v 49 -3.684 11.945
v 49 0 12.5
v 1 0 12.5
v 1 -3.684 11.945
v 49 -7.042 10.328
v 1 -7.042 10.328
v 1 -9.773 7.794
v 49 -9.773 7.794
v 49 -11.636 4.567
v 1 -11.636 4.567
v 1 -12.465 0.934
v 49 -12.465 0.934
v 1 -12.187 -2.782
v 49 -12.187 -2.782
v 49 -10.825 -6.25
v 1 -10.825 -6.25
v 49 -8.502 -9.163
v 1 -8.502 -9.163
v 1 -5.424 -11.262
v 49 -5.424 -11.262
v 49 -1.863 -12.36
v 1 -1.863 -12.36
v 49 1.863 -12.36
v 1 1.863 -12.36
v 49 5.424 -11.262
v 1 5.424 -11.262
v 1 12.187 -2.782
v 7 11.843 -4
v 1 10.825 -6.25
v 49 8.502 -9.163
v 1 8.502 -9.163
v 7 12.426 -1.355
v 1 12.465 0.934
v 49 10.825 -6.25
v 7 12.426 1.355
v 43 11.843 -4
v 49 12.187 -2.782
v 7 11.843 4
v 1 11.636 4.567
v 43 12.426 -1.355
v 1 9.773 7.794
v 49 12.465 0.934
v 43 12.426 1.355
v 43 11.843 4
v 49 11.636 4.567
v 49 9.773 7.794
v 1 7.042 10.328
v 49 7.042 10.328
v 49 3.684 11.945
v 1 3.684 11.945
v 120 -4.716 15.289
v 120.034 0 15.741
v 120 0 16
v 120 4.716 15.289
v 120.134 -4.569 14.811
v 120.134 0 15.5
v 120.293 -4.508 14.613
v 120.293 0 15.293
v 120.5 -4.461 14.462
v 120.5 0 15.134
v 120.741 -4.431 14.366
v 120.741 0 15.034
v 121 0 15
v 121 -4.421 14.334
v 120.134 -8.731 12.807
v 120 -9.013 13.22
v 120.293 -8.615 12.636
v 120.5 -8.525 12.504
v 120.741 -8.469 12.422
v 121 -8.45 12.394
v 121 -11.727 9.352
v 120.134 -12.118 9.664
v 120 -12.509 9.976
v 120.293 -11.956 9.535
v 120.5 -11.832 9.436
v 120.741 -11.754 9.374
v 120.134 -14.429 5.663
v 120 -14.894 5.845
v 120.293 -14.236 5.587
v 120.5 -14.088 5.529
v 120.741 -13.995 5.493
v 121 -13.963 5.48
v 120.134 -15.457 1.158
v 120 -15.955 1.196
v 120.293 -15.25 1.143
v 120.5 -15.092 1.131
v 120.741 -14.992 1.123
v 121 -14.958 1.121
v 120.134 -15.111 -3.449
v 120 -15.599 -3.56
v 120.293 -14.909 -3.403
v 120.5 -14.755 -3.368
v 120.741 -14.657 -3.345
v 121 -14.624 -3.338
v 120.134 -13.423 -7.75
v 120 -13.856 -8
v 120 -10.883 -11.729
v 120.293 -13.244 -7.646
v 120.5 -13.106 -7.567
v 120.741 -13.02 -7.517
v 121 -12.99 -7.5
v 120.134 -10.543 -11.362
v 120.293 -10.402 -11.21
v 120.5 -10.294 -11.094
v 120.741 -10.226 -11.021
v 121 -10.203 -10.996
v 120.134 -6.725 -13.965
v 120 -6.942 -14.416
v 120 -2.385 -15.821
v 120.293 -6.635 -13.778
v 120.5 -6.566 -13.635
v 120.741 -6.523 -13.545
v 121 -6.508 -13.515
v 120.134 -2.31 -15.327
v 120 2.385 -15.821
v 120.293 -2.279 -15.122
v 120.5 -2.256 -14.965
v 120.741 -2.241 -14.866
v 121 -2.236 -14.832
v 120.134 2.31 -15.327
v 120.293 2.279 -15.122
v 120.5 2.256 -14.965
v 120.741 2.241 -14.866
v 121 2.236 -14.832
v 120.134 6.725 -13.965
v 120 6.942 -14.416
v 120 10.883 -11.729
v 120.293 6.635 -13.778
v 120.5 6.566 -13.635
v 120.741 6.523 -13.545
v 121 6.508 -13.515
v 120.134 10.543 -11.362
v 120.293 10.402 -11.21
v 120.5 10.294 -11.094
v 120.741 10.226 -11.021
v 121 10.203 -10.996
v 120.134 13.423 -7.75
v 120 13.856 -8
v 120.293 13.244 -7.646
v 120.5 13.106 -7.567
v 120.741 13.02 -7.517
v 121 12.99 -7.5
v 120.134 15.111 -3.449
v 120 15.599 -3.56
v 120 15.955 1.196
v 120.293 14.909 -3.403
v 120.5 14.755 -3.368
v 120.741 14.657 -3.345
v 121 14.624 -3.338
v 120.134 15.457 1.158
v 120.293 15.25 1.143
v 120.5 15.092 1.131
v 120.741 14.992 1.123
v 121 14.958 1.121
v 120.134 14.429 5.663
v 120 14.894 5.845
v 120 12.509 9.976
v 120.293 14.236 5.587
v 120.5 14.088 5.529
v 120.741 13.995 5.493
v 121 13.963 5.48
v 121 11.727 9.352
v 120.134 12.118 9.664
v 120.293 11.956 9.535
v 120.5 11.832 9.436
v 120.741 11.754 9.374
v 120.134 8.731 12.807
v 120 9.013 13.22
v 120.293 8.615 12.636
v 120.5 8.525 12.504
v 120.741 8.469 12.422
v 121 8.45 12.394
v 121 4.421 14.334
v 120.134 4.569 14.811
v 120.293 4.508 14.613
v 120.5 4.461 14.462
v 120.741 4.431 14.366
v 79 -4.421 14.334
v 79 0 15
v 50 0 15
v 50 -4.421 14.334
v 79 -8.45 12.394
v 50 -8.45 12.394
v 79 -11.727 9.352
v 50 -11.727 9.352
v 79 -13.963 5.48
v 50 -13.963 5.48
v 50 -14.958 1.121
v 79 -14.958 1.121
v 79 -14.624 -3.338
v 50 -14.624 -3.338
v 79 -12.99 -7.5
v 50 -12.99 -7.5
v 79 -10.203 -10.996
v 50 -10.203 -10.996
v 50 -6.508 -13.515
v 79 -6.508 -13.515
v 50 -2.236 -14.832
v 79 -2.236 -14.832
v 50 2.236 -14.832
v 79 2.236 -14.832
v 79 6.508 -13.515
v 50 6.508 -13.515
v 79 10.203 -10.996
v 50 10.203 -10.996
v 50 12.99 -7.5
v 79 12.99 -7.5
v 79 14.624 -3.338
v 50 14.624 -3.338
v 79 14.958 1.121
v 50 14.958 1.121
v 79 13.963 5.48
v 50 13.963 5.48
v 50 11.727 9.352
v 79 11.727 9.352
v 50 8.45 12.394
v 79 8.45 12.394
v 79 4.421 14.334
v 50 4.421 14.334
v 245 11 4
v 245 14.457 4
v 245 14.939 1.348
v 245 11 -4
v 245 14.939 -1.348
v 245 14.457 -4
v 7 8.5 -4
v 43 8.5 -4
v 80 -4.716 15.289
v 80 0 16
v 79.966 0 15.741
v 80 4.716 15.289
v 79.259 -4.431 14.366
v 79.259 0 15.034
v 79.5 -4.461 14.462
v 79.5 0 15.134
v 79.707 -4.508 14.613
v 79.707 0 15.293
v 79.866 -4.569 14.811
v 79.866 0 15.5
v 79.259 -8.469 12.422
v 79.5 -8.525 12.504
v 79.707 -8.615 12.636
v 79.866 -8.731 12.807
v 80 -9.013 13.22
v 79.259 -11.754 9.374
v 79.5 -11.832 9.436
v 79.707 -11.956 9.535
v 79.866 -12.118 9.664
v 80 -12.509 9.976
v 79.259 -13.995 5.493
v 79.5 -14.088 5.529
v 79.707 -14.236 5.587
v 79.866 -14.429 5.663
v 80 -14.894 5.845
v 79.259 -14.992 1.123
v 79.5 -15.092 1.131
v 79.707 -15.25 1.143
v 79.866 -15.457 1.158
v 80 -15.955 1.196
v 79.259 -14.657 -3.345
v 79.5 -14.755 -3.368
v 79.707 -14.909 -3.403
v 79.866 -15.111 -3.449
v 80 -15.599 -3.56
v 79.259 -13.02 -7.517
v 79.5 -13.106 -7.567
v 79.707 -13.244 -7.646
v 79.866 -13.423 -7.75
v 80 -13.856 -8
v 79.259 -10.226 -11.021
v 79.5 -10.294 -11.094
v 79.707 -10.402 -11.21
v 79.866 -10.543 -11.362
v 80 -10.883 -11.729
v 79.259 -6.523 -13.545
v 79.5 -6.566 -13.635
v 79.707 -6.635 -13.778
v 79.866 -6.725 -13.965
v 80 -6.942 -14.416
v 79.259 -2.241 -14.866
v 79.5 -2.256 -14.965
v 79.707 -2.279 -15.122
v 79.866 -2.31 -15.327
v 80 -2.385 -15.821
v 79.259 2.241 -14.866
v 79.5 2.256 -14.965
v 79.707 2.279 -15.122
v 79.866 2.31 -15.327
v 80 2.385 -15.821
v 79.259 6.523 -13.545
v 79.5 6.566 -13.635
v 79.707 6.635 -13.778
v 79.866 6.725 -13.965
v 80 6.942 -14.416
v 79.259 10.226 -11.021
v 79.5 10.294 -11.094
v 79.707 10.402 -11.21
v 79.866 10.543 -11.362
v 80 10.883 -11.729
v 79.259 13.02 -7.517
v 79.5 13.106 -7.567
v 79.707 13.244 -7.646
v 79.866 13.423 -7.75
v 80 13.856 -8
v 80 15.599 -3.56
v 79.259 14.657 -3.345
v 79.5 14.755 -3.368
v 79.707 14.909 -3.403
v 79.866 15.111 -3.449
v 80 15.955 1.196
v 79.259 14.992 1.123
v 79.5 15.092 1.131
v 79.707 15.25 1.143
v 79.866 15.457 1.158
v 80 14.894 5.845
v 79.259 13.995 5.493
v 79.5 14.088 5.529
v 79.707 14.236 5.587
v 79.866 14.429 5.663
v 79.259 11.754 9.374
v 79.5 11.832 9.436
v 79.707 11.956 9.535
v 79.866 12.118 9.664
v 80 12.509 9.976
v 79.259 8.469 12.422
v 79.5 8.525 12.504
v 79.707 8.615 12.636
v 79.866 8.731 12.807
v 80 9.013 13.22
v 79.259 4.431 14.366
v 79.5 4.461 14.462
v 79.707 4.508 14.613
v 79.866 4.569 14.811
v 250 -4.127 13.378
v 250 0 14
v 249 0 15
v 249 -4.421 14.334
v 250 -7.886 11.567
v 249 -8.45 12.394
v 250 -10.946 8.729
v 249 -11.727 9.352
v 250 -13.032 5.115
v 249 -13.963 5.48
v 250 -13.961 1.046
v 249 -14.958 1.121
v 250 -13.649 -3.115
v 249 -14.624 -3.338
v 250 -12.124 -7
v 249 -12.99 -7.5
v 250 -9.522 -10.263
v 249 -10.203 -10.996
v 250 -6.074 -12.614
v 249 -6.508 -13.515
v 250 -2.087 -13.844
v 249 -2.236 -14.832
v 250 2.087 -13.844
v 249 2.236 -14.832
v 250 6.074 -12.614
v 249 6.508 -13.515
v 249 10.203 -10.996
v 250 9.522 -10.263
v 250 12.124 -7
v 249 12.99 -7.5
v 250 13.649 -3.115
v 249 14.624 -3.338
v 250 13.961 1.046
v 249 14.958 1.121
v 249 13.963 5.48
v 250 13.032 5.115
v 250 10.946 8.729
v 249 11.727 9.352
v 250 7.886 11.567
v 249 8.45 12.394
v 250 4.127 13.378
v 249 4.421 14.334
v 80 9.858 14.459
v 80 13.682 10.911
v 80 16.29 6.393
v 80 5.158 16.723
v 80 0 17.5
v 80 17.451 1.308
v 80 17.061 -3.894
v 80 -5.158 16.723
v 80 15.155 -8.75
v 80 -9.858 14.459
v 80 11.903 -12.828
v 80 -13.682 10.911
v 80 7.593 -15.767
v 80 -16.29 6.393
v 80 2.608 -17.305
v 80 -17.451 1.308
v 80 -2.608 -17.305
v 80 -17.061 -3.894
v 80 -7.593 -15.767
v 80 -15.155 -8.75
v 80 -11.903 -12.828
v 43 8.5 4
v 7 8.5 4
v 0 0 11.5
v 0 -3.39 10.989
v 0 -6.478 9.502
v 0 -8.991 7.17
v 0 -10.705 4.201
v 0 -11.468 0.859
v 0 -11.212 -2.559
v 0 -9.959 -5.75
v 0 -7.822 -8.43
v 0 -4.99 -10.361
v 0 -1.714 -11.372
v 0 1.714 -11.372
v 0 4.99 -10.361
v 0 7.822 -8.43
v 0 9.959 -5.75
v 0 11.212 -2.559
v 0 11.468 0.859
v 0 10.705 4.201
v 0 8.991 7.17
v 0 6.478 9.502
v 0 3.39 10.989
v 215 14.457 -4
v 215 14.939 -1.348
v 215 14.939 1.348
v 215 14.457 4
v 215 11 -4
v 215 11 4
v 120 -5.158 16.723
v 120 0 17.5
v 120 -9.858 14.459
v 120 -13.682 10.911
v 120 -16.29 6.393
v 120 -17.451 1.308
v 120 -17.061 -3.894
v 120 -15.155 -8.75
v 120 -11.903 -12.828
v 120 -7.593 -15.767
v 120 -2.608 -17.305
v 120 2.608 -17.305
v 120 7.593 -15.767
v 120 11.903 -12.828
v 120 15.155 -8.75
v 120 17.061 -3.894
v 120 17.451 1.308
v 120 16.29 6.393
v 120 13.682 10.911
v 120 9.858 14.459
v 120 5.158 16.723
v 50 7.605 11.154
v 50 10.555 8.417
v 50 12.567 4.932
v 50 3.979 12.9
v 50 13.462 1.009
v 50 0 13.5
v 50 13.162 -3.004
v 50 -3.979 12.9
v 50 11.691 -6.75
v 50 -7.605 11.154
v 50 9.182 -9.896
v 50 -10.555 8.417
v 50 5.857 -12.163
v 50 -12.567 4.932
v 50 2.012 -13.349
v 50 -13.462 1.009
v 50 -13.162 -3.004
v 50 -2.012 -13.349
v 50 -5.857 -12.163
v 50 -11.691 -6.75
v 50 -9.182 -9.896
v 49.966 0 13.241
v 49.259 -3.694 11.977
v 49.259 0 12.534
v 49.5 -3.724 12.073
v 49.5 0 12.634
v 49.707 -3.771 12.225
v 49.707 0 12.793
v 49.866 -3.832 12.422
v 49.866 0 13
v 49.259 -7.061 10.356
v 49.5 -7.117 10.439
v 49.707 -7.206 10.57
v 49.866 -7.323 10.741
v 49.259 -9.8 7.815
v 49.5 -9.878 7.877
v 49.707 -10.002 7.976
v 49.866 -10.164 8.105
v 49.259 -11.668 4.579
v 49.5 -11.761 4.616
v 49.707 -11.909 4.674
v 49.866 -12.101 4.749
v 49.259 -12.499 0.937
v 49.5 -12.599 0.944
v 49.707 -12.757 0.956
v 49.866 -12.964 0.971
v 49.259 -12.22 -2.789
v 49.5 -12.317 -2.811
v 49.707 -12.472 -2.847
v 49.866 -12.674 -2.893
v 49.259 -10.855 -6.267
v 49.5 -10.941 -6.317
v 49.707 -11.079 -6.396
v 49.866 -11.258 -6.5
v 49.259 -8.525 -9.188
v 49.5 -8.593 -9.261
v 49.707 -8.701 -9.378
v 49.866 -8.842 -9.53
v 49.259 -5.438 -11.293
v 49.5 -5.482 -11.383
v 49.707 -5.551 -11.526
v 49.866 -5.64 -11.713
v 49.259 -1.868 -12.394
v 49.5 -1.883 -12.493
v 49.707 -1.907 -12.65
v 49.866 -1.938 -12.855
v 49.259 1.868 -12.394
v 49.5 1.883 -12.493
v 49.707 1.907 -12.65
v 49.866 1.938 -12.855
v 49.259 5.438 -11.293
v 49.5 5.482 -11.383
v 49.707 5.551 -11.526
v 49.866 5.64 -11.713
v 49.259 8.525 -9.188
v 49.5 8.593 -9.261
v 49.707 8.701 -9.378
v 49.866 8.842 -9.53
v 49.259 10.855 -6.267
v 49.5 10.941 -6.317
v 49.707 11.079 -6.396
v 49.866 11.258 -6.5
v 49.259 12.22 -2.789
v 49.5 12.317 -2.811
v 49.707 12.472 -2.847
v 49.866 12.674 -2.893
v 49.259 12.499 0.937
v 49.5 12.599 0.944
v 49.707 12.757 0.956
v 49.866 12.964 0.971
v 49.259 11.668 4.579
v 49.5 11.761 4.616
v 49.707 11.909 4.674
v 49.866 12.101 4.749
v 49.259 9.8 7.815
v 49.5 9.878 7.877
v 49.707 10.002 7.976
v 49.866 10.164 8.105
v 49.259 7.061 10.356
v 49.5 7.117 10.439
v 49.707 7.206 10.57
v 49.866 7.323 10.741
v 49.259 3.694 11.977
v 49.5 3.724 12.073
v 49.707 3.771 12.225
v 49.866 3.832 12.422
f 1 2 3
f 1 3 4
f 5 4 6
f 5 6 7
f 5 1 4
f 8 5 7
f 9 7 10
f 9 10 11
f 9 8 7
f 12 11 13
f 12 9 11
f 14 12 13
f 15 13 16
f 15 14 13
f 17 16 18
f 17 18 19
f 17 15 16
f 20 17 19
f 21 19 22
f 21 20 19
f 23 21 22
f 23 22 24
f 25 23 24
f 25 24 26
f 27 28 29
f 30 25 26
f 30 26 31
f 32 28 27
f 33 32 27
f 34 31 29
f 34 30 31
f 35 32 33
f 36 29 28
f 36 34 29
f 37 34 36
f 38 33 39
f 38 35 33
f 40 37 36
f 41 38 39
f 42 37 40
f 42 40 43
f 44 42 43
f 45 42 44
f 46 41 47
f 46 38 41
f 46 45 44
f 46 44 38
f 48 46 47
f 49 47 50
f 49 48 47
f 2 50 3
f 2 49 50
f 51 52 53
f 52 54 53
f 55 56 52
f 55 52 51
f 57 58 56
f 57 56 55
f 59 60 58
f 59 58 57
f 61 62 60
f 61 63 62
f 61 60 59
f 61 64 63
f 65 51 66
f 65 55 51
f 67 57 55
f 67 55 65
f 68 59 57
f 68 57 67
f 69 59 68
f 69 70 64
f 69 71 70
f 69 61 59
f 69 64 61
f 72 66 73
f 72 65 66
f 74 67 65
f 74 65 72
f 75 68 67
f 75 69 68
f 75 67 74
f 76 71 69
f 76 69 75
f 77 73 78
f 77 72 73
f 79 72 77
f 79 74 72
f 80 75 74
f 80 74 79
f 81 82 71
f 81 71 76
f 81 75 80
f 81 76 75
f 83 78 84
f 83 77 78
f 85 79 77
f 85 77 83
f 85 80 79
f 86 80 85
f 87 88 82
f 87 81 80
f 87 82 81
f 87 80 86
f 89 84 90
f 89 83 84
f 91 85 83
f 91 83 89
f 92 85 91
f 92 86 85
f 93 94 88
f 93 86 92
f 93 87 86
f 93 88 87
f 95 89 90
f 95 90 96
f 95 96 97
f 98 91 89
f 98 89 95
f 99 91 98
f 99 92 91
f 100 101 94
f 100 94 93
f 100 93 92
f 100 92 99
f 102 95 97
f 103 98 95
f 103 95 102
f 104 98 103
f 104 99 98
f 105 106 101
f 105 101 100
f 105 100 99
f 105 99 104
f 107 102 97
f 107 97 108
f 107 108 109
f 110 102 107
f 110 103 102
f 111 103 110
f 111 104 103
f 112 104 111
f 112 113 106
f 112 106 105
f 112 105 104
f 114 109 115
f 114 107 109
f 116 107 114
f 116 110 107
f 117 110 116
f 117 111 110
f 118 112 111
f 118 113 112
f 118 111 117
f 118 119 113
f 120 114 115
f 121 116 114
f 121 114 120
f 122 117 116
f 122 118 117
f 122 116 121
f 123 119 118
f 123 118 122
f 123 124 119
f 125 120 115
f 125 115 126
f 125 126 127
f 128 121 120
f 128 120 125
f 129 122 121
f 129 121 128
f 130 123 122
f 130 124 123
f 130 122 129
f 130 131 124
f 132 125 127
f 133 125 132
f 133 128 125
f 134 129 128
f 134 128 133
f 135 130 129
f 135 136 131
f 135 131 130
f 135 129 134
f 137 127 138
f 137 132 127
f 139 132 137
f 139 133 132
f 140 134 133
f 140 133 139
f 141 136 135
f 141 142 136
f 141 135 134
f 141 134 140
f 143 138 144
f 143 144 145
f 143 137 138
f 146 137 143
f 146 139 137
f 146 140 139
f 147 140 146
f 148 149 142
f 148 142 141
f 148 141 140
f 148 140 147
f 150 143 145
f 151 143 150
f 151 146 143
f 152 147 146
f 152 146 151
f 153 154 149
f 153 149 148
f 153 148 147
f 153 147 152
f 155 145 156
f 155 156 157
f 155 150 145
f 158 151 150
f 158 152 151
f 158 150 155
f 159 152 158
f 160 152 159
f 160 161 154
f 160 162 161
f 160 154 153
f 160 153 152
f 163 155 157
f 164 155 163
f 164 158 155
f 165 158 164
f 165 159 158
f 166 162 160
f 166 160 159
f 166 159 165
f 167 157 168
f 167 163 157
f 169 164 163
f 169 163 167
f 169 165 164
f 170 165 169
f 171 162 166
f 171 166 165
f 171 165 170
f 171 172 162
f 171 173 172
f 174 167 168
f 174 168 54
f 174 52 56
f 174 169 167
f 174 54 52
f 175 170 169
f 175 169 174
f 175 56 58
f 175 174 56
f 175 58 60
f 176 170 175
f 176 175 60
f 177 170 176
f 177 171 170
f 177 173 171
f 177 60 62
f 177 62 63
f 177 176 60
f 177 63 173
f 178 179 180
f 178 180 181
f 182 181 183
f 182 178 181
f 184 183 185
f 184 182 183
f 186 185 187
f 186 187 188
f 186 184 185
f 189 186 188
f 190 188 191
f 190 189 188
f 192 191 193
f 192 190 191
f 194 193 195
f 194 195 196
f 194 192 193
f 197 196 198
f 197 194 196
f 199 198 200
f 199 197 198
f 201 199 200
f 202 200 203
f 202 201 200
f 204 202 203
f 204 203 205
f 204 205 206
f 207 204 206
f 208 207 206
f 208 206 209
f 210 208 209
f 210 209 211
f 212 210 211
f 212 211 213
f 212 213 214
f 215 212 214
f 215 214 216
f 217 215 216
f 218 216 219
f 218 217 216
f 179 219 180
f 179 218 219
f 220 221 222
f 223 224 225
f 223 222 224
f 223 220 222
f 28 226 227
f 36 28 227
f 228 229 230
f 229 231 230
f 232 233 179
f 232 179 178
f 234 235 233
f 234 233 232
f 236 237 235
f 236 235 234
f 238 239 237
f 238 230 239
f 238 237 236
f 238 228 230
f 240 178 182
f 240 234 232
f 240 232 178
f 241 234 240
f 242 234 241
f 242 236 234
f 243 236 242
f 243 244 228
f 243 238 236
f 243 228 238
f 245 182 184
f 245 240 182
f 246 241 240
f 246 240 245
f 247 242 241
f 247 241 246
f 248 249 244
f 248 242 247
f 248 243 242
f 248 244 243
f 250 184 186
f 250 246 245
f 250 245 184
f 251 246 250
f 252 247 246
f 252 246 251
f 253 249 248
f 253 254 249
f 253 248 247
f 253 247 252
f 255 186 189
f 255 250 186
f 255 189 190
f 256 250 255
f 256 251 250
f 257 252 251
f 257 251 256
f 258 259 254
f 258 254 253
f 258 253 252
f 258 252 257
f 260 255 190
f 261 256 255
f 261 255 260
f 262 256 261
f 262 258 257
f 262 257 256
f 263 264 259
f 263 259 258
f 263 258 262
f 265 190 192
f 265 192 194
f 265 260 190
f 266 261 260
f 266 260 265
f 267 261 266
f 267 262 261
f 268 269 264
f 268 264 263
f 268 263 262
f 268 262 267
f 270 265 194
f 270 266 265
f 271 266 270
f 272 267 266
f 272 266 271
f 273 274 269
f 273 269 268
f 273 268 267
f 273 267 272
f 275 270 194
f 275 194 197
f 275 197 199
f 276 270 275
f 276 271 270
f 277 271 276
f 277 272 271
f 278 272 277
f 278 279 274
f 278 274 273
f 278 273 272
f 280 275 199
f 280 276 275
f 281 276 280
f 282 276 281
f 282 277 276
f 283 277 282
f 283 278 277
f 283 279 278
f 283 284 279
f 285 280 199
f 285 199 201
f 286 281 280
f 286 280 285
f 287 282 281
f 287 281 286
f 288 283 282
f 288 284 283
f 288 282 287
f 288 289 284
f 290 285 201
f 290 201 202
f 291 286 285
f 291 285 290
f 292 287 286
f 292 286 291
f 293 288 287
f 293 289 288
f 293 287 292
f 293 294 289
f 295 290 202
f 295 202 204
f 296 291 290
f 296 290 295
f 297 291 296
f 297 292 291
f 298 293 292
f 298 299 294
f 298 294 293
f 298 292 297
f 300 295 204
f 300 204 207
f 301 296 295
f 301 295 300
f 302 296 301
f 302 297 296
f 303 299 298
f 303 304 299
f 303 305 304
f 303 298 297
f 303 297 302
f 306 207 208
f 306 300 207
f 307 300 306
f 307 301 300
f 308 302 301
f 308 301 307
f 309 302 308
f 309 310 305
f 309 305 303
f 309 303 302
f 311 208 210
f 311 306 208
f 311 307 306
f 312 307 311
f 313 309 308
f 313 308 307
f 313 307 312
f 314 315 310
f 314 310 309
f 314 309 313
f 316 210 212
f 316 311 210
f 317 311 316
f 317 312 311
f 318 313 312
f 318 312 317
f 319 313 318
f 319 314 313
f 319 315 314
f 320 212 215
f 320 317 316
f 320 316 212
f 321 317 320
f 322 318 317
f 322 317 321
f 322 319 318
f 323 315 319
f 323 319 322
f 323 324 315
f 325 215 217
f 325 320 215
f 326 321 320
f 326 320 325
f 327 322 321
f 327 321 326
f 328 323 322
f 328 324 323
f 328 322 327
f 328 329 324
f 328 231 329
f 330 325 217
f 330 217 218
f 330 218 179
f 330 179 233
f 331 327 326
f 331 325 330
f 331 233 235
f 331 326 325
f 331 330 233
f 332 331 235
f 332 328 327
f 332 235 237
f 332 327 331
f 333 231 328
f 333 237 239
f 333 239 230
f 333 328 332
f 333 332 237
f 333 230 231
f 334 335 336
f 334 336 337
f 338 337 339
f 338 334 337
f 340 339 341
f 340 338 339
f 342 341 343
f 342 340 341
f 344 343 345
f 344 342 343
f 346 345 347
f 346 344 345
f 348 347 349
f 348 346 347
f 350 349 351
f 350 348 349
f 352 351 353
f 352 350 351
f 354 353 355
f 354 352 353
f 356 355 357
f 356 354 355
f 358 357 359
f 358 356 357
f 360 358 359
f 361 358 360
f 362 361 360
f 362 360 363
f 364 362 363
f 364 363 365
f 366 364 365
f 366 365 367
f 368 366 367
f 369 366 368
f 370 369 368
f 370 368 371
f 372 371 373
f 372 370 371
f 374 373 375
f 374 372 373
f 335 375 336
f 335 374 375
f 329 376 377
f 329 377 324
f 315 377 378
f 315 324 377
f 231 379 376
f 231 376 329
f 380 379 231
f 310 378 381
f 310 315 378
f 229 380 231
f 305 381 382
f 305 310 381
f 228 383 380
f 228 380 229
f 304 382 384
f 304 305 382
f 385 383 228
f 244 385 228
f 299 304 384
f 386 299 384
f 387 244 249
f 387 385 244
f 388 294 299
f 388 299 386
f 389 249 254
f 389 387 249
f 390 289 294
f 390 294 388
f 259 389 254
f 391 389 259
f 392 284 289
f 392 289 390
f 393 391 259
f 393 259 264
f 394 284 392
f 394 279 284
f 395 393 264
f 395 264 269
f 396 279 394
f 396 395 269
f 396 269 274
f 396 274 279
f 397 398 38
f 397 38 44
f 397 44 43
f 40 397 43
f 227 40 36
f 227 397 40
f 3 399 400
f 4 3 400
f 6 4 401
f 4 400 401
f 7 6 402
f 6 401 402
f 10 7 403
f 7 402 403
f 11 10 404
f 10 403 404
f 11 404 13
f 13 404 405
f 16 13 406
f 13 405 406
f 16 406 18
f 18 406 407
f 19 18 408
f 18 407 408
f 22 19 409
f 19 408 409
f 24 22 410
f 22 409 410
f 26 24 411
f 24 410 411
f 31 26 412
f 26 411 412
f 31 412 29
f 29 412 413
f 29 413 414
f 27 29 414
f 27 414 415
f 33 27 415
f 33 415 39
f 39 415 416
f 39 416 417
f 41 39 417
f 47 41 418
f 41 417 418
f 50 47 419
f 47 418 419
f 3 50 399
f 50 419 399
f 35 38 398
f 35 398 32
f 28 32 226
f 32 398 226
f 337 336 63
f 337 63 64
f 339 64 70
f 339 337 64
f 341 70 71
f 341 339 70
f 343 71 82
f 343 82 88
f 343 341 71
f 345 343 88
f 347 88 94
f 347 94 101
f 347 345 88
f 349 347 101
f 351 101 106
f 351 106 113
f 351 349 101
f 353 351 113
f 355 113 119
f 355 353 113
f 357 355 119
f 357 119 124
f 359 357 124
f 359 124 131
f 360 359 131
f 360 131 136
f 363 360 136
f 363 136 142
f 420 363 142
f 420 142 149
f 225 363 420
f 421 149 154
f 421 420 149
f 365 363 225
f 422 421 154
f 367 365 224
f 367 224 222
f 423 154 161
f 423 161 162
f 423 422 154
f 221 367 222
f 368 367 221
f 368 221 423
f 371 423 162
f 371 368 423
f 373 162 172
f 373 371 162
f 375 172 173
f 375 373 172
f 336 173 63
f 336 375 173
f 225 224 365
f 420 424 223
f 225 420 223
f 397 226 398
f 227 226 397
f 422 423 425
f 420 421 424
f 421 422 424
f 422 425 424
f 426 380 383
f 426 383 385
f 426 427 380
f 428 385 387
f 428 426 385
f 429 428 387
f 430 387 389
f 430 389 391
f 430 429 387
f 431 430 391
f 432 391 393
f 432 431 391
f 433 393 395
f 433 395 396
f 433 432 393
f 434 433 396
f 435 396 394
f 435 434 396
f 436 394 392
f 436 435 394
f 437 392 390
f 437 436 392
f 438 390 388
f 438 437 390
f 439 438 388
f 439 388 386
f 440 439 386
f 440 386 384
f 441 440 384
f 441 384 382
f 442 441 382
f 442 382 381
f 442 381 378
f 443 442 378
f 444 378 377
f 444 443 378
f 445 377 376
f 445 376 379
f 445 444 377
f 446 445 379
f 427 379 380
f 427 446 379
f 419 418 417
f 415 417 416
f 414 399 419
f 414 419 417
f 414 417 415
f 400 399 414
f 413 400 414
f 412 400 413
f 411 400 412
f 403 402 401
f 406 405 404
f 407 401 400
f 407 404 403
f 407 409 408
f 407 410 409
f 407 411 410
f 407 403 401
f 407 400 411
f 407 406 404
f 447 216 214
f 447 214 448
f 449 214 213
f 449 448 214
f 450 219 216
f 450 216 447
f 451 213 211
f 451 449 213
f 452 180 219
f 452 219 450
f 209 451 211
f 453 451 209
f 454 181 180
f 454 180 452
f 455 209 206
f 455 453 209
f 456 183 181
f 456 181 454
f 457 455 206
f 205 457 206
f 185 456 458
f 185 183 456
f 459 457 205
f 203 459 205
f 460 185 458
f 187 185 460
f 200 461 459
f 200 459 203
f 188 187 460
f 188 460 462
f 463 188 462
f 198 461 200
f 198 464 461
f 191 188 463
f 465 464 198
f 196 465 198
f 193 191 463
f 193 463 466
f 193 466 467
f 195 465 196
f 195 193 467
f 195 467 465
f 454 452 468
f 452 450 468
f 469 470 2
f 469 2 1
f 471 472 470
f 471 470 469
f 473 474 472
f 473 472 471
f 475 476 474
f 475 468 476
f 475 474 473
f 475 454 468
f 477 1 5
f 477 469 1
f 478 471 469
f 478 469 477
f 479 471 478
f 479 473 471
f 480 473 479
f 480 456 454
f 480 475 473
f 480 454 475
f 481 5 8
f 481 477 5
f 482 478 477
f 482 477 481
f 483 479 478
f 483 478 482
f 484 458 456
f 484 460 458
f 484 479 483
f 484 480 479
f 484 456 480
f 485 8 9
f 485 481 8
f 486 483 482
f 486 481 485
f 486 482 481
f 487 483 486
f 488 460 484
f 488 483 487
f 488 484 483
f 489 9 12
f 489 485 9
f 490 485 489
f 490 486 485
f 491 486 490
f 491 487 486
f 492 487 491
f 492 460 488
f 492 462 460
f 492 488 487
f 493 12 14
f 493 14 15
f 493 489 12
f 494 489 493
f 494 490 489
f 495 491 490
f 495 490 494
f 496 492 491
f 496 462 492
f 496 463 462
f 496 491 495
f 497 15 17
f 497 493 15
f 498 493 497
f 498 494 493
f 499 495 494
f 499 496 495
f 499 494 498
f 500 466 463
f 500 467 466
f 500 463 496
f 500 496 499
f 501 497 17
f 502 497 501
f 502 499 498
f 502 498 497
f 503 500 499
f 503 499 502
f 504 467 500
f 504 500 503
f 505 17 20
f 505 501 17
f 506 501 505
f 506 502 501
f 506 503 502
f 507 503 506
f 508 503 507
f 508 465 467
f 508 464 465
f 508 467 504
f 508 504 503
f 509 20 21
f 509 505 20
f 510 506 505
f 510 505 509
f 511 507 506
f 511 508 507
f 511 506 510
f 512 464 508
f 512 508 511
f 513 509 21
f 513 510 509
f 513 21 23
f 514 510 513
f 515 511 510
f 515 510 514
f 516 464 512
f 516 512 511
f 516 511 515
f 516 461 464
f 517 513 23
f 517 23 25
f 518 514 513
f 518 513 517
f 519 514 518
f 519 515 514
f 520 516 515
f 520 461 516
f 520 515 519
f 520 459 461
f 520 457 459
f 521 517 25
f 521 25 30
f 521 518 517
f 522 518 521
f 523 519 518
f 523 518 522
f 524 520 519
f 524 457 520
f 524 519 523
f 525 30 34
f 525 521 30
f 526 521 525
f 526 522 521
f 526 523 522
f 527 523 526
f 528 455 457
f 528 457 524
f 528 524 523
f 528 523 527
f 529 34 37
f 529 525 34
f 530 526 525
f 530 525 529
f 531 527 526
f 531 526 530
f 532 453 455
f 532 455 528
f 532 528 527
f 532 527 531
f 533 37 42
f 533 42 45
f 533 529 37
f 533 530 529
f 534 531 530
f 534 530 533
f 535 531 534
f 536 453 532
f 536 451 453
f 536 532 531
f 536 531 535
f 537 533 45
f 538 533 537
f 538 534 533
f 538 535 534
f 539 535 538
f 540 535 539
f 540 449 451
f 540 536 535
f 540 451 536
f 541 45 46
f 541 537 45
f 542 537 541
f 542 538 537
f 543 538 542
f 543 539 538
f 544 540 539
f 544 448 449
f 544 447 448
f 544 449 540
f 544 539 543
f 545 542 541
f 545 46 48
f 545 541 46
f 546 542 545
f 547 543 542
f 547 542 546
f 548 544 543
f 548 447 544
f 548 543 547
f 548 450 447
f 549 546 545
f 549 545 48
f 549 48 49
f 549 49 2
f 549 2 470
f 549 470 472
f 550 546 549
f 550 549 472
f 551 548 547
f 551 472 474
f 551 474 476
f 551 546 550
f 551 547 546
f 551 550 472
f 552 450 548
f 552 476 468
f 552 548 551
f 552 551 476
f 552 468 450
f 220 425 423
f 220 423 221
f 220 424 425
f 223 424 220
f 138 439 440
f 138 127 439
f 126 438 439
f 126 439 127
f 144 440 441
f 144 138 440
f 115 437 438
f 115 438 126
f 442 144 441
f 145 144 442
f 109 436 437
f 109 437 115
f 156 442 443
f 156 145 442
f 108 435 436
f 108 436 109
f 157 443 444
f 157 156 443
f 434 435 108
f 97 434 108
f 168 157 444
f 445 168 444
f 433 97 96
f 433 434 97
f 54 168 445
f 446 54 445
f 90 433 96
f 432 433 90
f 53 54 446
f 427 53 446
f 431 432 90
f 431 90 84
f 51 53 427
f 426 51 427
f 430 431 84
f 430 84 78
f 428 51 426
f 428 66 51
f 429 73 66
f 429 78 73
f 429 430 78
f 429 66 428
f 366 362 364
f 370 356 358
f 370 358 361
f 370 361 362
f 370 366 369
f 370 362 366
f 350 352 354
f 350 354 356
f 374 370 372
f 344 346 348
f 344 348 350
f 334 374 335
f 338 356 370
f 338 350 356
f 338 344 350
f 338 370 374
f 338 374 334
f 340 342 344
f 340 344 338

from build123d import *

# Parameters (mm, degrees)
SKETCH2_W          = 36
SKETCH2_H          = 8
CUT_EXTRUDE2_DEPTH = 252.956841542
SKETCH3_W          = 30
SKETCH3_H          = 8
CUT_EXTRUDE3_DEPTH = 253.227080227
FILLET1_R          = 1
CHAMFER1_SIZE      = 1


with BuildPart() as part:
    # Sketch1 → Revolve1 (revolve)
    with BuildSketch(Plane.XY, mode=Mode.PRIVATE) as revolve1_sk:
        Polygon((0, 0), (0, 12.5), (50, 12.5), (50, 15), (80, 15), (80, 17.5), (120, 17.5), (120, 15), (250, 15), (250, 0), align=None)
    revolve(revolve1_sk.sketch.rotate(Axis((0, 0, 0), (1, 0, 0)), 90), axis=Axis((0, 0, 0), (1, 0, 0)))

    # Sketch2 → Cut-Extrude2 (cut, through all)
    with BuildSketch(Plane(origin=(0, 8.5, 0), x_dir=(1, 0, 0), z_dir=(0, 1, 0))):
        with Locations((25, 0)):
            Rectangle(SKETCH2_W, SKETCH2_H)
    extrude(amount=CUT_EXTRUDE2_DEPTH, mode=Mode.SUBTRACT)

    # Sketch3 → Cut-Extrude3 (cut, through all)
    with BuildSketch(Plane(origin=(0, 11, 0), x_dir=(1, 0, 0), z_dir=(0, 1, 0))):
        with Locations((230, 0)):
            Rectangle(SKETCH3_W, SKETCH3_H)
    extrude(amount=CUT_EXTRUDE3_DEPTH, mode=Mode.SUBTRACT)

    # Fillet1
    fillet1_edges = [part.edges().sort_by_distance(p)[0] for p in [
        (80, 0, -15),
        (50, 0, -12.5),
        (120, 0, -15),
    ]]
    fillet(fillet1_edges, radius=FILLET1_R)

    # Chamfer1
    chamfer1_edges = [part.edges().sort_by_distance(p)[0] for p in [
        (0, 0, -12.5),
        (250, 0, -15),
    ]]
    chamfer(chamfer1_edges, length=CHAMFER1_SIZE)


solid = part.part
